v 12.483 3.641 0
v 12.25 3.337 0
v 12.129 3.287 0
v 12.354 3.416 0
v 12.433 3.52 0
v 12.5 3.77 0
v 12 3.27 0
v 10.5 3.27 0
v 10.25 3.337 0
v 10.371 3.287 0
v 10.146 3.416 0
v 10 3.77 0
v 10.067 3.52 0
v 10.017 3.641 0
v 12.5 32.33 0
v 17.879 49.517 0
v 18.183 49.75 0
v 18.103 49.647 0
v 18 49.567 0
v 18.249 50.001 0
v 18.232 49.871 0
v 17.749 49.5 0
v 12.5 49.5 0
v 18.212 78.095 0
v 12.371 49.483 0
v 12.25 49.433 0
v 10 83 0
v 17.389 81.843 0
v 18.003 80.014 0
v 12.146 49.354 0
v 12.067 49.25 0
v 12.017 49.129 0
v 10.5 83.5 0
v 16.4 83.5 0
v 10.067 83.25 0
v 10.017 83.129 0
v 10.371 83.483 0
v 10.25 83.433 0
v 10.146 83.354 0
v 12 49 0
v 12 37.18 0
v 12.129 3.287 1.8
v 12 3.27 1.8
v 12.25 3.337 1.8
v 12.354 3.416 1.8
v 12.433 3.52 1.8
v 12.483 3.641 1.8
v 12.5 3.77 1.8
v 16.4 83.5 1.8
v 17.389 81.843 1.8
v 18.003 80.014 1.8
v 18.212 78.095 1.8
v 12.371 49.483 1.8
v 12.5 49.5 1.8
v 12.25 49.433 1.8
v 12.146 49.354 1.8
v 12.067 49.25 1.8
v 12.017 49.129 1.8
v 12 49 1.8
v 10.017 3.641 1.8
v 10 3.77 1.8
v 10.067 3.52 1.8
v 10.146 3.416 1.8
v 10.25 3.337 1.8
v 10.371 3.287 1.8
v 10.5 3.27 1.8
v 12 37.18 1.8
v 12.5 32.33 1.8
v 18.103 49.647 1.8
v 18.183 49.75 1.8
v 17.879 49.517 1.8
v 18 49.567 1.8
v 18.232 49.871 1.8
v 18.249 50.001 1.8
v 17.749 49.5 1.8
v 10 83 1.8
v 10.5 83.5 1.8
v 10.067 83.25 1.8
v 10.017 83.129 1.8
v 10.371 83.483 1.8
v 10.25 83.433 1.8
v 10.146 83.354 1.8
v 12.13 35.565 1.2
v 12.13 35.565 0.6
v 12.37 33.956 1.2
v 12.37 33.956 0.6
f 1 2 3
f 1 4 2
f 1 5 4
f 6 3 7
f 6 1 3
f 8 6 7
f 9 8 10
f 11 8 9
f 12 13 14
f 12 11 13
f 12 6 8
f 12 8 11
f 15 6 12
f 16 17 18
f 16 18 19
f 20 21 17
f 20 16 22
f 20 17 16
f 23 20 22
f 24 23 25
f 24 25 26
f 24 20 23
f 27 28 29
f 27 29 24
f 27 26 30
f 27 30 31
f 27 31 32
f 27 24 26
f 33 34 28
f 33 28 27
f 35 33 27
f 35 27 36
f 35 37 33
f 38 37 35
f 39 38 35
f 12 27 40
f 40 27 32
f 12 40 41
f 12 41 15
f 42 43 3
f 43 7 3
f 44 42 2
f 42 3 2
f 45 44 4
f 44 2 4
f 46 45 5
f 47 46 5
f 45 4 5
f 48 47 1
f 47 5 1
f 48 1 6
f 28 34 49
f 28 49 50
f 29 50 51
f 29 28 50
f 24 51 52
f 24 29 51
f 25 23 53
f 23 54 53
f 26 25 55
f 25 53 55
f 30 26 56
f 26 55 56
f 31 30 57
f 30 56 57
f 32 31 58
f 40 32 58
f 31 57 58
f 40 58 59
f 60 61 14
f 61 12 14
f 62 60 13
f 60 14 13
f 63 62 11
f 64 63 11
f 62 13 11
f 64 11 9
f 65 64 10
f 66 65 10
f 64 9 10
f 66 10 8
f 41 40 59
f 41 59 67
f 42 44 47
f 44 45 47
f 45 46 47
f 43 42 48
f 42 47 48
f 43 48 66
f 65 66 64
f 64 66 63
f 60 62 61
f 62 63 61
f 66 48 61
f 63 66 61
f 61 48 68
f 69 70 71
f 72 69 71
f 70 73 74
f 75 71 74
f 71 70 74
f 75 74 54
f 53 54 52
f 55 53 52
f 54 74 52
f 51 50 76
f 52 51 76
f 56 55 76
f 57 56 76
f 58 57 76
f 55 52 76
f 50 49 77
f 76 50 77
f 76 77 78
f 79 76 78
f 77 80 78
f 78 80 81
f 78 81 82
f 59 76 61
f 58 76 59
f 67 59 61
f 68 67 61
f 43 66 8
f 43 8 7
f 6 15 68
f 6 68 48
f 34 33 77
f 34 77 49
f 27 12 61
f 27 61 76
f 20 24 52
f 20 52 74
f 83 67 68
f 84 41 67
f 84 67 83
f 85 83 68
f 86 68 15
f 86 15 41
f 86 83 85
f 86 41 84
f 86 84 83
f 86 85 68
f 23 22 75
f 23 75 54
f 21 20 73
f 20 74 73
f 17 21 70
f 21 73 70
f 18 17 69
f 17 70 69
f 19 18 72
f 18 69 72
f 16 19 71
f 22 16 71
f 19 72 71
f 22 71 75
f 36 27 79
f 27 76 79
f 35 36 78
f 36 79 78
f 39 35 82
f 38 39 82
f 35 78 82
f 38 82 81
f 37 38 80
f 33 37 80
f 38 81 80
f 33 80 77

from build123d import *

# Parameters (mm, degrees)
BOSS_EXTRUDE1_DEPTH = 1.8
FILLET1_R           = 0.5
SKETCH5_R           = 2.5
SKETCH5_R_2         = 1.75
BOSS_EXTRUDE2_DEPTH = 1.8
FILLET2_R           = 1
CUT_EXTRUDE1_DEPTH  = 86.48993183
FILLET3_R           = 0.5


with BuildPart() as part:
    # Sketch1 → Boss-Extrude1 (new body)
    with BuildSketch(Plane.XY):
        with BuildLine():
            Line((0, 4.5), (0, 6.5))
            Line((0, 6.5), (6.1, 6.5))
            Line((6.1, 6.5), (6.1, 10.5))
            Line((6.1, 10.5), (10, 14.4))
            Line((10, 14.4), (10, 83.5))
            Line((10, 83.5), (16.4, 83.5))
            ThreePointArc((16.4, 83.5), (17.745328581, 80.945017946), (18.212299295, 78.095495067))
            Line((18.212299295, 78.095495067), (18.25, 49.5))
            Line((18.25, 49.5), (12, 49.5))
            Line((12, 49.5), (12, 37.18))
            add(Edge.make_bspline(
                [(12, 37.18), (12, 35.554764974), (12.5, 33.972282338), (12.5, 32.33)],
                knots=[0, 0, 0, 0, 1, 1, 1, 1], degree=3))
            Line((12.5, 32.33), (12.5, 3.07))
            ThreePointArc((12.5, 3.07), (11.600817818, 0.899182182), (9.43, 0))
            ThreePointArc((9.43, 0), (4.205660329, 1.182650422), (0, 4.5))
        make_face()
    extrude(amount=BOSS_EXTRUDE1_DEPTH)

    # Fillet1
    fillet1_edges = [part.edges().sort_by_distance(p)[0] for p in [
        (0, 6.5, 0.9),
        (6.1, 6.5, 0.9),
        (6.1, 10.5, 0.9),
        (10, 14.4, 0.9),
        (10, 83.5, 0.9),
        (18.25, 49.5, 0.9),
        (12, 49.5, 0.9),
    ]]
    fillet(fillet1_edges, radius=FILLET1_R)

    # Sketch5 → Boss-Extrude2 (add)
    # profile 1 of 3: a face of its own
    with BuildSketch(Plane(origin=(0, 0, 0), x_dir=(-1, 0, 0), z_dir=(0, 0, -1))):
        with Locations((-9.5, -2.499832541)):
            Circle(SKETCH5_R)
        with Locations((-9.5, -2.499832541)):
            Circle(SKETCH5_R_2, mode=Mode.SUBTRACT)
    # profile 2 of 3: a face of its own
    with BuildSketch(Plane(origin=(0, 0, 0), x_dir=(-1, 0, 0), z_dir=(0, 0, -1))):
        with BuildLine():
            ThreePointArc((-11.824045318, -1.578521867), (-9.031018815, -0.044215175), (-7, -2.499832541))
            Line((-7, -2.499832541), (-7, 0.245881701))
            ThreePointArc((-7, 0.245881701), (-8.2087959, 0.061626967), (-9.43, 0))
            ThreePointArc((-9.43, 0), (-10.256451345, 0.113333266), (-11.021883517, 0.444965358))
            Line((-11.021883517, 0.444965358), (-11.824045318, -1.578521867))
        make_face()
    # profile 3 of 3: a face of its own
    with BuildSketch(Plane(origin=(0, 0, 0), x_dir=(-1, 0, 0), z_dir=(0, 0, -1))):
        with BuildLine():
            ThreePointArc((-9.43, 0), (-8.2087959, 0.061626967), (-7, 0.245881701))
            Line((-7, 0.245881701), (-7, 0.500167459))
            Line((-7, 0.500167459), (-11, 0.500167459))
            Line((-11, 0.500167459), (-11.021883517, 0.444965358))
            ThreePointArc((-11.021883517, 0.444965358), (-10.256451345, 0.113333266), (-9.43, 0))
        make_face()
    extrude(amount=-BOSS_EXTRUDE2_DEPTH)

    # Fillet2
    fillet2_edges = [part.edges().sort_by_distance(p)[0] for p in [
        (7, 0.245881701, 0.9),
        (11.021883517, 0.444965358, 0.9),
    ]]
    fillet(fillet2_edges, radius=FILLET2_R)

    # Sketch6 → Cut-Extrude1 (cut, through all)
    with BuildSketch(Plane.XY.offset(1.8)):
        Polygon((10, 23.170696855), (10, 3.27), (15.071898879, 3.27), (15.071898879, -7.898815654), (-3.496989456, -7.898815654), (-3.496989456, 23.170696855), align=None)
    extrude(amount=-CUT_EXTRUDE1_DEPTH, mode=Mode.SUBTRACT)

    # Fillet3
    fillet3_edges = [part.edges().sort_by_distance(p)[0] for p in [
        (12.5, 3.27, 0.9),
        (10, 3.27, 0.9),
    ]]
    fillet(fillet3_edges, radius=FILLET3_R)


solid = part.part
